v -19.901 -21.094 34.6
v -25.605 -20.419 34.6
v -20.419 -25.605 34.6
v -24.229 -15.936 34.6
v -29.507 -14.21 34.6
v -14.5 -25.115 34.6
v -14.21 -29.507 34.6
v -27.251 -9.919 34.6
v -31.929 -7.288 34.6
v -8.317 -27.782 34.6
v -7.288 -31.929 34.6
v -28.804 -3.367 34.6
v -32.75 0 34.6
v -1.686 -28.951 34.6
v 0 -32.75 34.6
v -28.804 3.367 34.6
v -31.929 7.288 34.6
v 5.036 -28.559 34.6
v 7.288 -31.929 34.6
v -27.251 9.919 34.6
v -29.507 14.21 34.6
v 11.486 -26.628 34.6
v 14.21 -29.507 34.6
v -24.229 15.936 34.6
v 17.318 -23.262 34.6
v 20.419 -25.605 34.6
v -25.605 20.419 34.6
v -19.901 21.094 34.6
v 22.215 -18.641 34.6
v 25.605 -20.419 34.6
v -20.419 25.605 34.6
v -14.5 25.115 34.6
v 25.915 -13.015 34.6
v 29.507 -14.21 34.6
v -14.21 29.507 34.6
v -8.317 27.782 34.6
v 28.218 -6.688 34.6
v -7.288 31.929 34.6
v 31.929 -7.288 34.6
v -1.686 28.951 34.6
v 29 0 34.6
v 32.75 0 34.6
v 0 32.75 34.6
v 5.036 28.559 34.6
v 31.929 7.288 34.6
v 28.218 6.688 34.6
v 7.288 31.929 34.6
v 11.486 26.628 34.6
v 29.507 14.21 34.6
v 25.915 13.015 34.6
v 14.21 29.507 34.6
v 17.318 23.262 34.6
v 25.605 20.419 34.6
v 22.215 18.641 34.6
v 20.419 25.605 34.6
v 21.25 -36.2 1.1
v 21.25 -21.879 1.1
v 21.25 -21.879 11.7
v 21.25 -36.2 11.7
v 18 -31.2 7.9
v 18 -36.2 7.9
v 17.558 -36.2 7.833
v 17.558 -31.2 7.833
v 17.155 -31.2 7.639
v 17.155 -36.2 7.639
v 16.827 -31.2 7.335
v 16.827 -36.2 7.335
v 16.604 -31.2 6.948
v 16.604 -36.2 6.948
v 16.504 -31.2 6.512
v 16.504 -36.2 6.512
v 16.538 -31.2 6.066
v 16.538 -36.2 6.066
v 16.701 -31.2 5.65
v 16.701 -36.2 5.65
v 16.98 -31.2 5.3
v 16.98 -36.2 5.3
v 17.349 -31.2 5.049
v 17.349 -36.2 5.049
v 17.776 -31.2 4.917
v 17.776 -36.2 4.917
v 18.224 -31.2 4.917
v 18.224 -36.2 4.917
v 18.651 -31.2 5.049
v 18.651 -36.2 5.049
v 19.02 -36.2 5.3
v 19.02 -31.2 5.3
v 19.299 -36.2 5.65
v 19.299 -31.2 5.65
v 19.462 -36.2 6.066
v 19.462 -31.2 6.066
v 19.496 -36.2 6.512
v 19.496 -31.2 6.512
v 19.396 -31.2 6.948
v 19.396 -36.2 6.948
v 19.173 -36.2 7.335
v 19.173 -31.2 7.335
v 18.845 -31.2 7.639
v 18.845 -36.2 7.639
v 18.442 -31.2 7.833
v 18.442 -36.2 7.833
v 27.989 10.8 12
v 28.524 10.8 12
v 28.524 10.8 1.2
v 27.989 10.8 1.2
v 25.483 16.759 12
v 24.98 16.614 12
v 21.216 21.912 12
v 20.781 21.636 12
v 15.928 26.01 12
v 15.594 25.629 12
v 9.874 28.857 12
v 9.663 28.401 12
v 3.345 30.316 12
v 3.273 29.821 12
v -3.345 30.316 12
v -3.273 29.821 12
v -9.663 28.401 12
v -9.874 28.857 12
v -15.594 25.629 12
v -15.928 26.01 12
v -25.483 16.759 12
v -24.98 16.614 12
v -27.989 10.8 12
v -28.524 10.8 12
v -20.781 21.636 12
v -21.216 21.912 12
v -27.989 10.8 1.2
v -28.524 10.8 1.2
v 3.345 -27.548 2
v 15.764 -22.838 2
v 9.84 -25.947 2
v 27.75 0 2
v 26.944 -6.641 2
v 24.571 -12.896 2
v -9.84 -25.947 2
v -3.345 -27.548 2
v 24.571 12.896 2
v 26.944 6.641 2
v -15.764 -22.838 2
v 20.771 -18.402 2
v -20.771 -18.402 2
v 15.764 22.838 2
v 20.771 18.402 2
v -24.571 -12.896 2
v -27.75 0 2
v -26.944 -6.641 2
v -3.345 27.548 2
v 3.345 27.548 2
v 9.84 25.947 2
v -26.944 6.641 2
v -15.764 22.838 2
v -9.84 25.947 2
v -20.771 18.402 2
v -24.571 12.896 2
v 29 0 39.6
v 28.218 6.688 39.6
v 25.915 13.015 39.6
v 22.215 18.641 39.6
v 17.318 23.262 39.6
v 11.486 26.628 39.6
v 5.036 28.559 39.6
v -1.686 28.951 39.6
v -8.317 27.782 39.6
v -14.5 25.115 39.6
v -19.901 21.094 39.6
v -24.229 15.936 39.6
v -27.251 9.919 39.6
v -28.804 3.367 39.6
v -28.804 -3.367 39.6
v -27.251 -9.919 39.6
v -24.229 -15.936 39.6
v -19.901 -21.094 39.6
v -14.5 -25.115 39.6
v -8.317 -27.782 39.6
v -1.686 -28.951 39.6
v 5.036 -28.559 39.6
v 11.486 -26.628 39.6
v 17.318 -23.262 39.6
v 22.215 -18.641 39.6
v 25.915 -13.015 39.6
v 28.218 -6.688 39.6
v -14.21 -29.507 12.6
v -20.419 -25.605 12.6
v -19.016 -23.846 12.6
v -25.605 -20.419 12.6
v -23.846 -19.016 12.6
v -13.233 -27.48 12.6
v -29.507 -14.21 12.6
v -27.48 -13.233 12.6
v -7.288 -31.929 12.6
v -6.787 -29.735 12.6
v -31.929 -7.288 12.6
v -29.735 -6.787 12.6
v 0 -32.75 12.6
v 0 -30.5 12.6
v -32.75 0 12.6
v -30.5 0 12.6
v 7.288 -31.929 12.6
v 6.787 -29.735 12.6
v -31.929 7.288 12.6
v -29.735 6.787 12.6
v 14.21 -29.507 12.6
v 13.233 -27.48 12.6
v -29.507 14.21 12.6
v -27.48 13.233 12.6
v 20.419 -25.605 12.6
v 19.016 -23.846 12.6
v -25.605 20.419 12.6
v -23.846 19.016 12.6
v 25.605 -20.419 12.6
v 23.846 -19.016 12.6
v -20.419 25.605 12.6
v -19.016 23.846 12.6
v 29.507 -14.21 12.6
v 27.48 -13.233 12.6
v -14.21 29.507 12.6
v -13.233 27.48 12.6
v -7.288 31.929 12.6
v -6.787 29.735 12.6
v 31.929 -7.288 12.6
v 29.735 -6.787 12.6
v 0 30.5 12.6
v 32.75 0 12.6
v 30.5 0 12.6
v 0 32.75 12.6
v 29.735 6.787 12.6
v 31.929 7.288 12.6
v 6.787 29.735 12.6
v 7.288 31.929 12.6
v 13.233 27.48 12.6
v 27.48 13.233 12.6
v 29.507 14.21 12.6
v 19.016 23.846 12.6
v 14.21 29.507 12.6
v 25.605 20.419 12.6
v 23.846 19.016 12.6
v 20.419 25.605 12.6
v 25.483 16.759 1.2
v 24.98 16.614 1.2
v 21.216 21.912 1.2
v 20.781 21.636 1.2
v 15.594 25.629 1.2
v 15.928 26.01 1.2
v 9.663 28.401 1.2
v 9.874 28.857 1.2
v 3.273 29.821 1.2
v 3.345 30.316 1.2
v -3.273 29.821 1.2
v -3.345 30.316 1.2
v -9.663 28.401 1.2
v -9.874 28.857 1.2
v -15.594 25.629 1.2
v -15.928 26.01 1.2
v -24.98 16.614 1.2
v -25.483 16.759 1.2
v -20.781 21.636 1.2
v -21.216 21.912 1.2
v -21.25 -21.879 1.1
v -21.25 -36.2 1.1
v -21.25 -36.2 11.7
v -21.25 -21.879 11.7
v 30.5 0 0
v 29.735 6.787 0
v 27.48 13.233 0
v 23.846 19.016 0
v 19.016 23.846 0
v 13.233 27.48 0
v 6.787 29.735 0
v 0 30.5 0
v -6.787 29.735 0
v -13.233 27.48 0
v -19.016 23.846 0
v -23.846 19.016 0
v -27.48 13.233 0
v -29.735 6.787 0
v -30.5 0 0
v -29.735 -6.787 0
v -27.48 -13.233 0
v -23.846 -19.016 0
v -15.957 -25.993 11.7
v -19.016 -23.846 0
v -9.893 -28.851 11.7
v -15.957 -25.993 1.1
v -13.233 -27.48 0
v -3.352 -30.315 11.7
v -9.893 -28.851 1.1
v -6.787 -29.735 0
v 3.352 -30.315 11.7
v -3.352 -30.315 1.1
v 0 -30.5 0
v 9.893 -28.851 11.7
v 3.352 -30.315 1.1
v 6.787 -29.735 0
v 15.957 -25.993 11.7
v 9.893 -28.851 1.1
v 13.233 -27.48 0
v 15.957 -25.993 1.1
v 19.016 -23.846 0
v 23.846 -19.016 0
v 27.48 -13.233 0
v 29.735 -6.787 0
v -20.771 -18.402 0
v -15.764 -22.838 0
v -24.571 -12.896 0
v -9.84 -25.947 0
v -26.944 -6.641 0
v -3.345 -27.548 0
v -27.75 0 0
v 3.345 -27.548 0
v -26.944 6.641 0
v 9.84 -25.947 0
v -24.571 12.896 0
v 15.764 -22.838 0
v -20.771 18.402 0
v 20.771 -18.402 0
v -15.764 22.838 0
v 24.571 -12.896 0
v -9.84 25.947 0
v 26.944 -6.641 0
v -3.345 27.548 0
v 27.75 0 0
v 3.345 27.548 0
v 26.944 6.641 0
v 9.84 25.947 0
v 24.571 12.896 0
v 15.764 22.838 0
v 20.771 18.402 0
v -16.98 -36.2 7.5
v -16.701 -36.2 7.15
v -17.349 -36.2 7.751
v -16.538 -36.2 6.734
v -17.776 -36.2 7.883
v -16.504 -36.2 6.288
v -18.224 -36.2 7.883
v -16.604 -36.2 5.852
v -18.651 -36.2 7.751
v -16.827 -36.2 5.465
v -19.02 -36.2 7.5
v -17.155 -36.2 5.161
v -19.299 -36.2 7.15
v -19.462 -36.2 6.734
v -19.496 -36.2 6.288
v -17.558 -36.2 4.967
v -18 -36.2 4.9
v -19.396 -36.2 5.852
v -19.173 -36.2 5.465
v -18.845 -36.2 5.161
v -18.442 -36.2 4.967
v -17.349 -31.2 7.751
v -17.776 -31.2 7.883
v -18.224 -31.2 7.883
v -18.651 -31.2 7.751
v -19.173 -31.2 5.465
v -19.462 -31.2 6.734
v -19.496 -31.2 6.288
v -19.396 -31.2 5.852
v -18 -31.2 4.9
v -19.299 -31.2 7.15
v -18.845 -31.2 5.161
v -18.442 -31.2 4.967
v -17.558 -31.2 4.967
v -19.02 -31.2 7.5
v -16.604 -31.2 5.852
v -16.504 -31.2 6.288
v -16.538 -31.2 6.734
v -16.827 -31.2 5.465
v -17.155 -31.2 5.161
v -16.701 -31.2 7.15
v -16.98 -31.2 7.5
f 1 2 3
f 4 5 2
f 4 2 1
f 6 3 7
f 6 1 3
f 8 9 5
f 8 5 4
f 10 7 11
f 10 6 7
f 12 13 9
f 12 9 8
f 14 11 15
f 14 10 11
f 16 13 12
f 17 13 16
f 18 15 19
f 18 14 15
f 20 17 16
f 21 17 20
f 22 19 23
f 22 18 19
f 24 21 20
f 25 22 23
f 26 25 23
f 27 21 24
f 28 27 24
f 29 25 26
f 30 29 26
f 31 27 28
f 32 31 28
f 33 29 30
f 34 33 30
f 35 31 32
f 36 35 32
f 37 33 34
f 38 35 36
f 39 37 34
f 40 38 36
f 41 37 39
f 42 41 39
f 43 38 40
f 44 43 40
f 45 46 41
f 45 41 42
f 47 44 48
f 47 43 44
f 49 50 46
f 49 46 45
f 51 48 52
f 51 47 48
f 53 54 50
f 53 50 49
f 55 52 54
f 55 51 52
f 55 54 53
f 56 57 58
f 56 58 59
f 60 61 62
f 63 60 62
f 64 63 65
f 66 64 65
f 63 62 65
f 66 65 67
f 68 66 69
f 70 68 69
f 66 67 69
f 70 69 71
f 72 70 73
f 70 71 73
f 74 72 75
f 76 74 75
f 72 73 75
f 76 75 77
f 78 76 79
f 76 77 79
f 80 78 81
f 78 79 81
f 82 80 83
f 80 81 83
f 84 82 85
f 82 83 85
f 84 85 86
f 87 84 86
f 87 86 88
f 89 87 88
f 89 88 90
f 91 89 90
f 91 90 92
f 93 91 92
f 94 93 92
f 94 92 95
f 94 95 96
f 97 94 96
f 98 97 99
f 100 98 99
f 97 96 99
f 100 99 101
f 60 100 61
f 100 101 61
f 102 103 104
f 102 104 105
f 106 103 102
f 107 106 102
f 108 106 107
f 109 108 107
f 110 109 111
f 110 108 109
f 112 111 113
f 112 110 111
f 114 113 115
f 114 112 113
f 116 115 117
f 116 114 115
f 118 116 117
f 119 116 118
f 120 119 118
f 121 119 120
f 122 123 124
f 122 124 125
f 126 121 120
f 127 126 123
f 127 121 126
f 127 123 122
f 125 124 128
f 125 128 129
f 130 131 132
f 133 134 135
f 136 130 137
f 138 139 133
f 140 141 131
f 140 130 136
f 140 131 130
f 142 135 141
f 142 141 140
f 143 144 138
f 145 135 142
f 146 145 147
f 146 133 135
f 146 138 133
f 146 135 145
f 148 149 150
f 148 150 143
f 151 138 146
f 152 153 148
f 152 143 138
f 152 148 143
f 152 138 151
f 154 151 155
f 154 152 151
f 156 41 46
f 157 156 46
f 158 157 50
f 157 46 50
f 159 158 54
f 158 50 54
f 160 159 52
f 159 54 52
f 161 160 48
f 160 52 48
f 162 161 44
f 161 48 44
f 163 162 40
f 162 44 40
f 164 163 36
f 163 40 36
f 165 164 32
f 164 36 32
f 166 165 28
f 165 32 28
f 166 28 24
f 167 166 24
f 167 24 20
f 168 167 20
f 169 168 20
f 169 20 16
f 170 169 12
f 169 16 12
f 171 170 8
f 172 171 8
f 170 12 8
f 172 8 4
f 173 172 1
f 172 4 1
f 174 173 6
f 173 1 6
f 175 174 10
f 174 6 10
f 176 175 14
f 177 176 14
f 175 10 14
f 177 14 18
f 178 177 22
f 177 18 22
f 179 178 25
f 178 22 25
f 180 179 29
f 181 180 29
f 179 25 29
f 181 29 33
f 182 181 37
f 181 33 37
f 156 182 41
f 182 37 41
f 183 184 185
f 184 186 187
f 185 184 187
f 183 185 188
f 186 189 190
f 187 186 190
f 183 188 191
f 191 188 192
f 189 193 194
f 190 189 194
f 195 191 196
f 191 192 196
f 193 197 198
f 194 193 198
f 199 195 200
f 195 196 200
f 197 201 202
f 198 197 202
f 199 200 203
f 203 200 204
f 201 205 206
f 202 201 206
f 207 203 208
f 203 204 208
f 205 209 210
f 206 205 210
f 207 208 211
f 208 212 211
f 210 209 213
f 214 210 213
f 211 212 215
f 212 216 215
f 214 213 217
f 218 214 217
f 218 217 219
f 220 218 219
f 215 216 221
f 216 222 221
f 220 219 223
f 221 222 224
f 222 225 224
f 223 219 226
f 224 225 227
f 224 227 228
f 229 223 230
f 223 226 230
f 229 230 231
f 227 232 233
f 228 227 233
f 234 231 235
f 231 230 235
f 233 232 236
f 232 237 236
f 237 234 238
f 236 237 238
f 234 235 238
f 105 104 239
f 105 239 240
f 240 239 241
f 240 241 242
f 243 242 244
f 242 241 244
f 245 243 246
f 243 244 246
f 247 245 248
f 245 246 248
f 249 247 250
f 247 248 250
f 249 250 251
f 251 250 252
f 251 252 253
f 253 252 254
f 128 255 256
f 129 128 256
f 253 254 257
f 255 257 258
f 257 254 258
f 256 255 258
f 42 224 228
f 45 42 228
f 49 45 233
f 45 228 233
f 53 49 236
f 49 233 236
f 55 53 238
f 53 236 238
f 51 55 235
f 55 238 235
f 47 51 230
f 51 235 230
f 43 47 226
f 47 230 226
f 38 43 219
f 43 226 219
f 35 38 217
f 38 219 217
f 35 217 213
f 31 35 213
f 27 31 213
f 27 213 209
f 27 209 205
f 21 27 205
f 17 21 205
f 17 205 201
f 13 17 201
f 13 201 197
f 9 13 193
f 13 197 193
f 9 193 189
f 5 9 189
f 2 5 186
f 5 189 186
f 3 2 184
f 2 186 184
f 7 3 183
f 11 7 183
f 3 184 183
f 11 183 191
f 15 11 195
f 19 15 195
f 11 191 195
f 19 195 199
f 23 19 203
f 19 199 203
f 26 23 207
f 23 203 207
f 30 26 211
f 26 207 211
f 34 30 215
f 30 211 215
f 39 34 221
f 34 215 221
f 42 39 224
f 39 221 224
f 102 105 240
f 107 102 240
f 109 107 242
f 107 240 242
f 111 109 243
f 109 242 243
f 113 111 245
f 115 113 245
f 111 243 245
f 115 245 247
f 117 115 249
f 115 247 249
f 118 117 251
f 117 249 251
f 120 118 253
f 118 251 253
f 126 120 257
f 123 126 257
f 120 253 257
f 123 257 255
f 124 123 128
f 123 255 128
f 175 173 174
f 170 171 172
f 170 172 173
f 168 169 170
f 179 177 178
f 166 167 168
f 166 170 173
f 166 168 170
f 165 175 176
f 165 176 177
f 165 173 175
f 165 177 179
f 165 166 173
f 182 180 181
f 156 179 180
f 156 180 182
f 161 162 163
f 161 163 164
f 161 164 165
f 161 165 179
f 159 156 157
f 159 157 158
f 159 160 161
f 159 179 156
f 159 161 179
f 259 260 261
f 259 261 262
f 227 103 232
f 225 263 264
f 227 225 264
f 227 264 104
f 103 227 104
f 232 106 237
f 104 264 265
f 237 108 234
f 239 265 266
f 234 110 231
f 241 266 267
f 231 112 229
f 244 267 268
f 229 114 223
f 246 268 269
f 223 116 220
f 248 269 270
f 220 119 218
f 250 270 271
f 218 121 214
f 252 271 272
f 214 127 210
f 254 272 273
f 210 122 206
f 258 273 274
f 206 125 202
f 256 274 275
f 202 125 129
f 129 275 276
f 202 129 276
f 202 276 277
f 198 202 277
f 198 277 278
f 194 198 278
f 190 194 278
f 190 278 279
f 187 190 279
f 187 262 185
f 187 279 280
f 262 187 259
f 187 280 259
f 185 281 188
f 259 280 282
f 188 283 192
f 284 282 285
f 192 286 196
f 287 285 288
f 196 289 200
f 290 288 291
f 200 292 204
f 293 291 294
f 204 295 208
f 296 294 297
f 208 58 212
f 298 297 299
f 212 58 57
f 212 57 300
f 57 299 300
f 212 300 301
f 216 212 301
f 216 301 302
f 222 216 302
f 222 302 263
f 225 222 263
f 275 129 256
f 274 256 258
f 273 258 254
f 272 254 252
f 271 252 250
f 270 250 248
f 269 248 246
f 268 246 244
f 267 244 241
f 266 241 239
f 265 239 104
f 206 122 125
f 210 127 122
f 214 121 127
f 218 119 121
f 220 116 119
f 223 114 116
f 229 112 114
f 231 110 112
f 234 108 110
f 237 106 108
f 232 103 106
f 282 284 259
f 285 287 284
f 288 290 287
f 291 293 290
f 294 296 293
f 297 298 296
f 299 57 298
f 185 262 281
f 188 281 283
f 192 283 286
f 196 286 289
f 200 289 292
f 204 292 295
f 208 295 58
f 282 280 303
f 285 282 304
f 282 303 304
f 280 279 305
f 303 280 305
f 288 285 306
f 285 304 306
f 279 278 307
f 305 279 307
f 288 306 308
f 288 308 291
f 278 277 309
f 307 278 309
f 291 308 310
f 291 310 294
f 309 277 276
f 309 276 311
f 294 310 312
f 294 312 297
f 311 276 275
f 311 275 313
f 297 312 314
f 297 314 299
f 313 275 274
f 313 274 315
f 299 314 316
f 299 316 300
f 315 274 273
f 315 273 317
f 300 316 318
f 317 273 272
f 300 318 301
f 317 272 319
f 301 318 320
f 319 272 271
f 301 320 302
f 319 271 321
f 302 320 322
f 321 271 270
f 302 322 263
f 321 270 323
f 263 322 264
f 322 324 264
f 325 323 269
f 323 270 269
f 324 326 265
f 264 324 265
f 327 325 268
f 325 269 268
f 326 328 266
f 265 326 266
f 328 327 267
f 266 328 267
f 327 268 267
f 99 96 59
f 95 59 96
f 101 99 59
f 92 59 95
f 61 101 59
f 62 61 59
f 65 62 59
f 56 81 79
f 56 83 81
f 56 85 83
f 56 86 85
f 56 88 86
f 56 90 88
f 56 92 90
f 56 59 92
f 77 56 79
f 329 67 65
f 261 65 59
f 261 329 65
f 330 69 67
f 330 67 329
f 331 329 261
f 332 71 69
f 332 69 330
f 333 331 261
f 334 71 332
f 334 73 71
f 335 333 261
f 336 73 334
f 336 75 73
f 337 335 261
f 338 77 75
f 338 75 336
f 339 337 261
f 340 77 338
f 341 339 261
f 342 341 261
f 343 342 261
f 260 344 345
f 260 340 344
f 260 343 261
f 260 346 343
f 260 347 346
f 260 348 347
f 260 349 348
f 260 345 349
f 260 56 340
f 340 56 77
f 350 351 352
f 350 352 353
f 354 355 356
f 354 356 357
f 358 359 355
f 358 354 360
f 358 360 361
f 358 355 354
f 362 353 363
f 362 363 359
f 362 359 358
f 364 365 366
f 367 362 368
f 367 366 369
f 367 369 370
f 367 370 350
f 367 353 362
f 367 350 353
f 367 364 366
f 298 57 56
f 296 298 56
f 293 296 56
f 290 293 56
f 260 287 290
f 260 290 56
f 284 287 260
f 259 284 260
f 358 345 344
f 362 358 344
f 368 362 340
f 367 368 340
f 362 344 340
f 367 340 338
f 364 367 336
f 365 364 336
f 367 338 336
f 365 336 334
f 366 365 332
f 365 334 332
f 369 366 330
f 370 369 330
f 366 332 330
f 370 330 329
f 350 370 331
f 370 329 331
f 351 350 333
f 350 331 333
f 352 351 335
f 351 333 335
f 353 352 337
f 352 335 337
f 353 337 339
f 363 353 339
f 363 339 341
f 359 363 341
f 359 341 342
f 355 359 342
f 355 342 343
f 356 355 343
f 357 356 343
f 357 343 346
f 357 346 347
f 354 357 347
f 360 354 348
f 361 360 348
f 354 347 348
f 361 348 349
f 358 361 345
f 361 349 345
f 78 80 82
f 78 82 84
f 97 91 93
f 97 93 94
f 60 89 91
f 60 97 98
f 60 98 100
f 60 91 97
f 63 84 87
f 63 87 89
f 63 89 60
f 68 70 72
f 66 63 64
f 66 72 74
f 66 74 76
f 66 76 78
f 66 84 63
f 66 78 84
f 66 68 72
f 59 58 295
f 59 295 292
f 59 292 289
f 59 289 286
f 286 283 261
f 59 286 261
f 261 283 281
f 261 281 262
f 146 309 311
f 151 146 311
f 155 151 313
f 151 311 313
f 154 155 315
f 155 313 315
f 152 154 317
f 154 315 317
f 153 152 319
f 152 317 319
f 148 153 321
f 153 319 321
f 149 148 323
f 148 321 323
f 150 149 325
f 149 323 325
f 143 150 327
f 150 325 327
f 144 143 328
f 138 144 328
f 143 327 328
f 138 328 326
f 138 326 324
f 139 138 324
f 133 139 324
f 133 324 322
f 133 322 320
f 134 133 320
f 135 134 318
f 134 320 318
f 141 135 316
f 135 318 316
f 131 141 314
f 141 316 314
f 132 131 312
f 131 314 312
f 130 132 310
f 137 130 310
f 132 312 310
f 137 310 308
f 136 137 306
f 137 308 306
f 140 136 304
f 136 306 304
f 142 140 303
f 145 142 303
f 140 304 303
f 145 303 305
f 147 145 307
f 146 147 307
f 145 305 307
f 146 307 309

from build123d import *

# Parameters (mm, degrees)
SKETCH_1_R          = 30.5
EXTRUDE_1_DEPTH     = 12.6
SKETCH_2_R          = 32.75
EXTRUDE_2_DEPTH     = 22
SKETCH_3_R          = 29
EXTRUDE_3_DEPTH     = 5
EXTRUDE_START       = -1.1
EXTRUDE_4_DEPTH     = 10.6
SKETCH_5_R          = 1.5
CUT_EXTRUDE_1_DEPTH = 5
SKETCH_6_R          = 27.75
CUT_EXTRUDE_2_DEPTH = 2
CUT_EXTRUDE_START   = -1.2
CUT_EXTRUDE_3_DEPTH = 10.8


with BuildPart() as part:
    # 草图1 → 凸台-拉伸1 (new body)
    with BuildSketch(Plane.XY):
        Circle(SKETCH_1_R)
    extrude(amount=EXTRUDE_1_DEPTH)

    # 草图2 → 凸台-拉伸2 (add)
    with BuildSketch(Plane.XY.offset(12.6)):
        Circle(SKETCH_2_R)
    extrude(amount=EXTRUDE_2_DEPTH)

    # 草图3 → 凸台-拉伸3 (add)
    with BuildSketch(Plane.XY.offset(34.6)):
        Circle(SKETCH_3_R)
    extrude(amount=EXTRUDE_3_DEPTH)

    # 草图4 → 凸台-拉伸4 (add)
    with BuildSketch(Plane(origin=(0, 0, 0), x_dir=(-1, 0, 0), z_dir=(0, 0, -1)).offset(EXTRUDE_START)):
        with BuildLine():
            ThreePointArc((21.25, -21.878928219), (0, -30.5), (-21.25, -21.878928219))
            Line((-21.25, -21.878928219), (-21.25, -36.2))
            Line((-21.25, -36.2), (21.25, -36.2))
            Line((21.25, -36.2), (21.25, -21.878928219))
        make_face()
    extrude(amount=-EXTRUDE_4_DEPTH)

    # 草图5 → 切除-拉伸1 (cut)
    with BuildSketch(Plane.XZ.offset(36.2)):
        with Locations(Location((-18, 6.4, 0), (0, 0, 270))):
            Circle(SKETCH_5_R)
        with Locations(Location((18, 6.4, 0), (0, 0, 90))):
            Circle(SKETCH_5_R)
    extrude(amount=-CUT_EXTRUDE_1_DEPTH, mode=Mode.SUBTRACT)

    # 草图6 → 切除-拉伸2 (cut)
    with BuildSketch(Plane(origin=(0, 0, 0), x_dir=(-1, 0, 0), z_dir=(0, 0, -1))):
        Circle(SKETCH_6_R)
    extrude(amount=-CUT_EXTRUDE_2_DEPTH, mode=Mode.SUBTRACT)

    # 草图7 → 切除-拉伸3 (cut)
    with BuildSketch(Plane(origin=(0, 0, 0), x_dir=(-1, 0, 0), z_dir=(0, 0, -1)).offset(CUT_EXTRUDE_START)):
        with BuildLine():
            ThreePointArc((28.52384967, 10.8), (0, 30.5), (-28.52384967, 10.8))
            Line((-28.52384967, 10.8), (-27.988569095, 10.8))
            ThreePointArc((-27.988569095, 10.8), (0, 30), (27.988569095, 10.8))
            Line((27.988569095, 10.8), (28.52384967, 10.8))
        make_face()
    extrude(amount=-CUT_EXTRUDE_3_DEPTH, mode=Mode.SUBTRACT)


solid = part.part
